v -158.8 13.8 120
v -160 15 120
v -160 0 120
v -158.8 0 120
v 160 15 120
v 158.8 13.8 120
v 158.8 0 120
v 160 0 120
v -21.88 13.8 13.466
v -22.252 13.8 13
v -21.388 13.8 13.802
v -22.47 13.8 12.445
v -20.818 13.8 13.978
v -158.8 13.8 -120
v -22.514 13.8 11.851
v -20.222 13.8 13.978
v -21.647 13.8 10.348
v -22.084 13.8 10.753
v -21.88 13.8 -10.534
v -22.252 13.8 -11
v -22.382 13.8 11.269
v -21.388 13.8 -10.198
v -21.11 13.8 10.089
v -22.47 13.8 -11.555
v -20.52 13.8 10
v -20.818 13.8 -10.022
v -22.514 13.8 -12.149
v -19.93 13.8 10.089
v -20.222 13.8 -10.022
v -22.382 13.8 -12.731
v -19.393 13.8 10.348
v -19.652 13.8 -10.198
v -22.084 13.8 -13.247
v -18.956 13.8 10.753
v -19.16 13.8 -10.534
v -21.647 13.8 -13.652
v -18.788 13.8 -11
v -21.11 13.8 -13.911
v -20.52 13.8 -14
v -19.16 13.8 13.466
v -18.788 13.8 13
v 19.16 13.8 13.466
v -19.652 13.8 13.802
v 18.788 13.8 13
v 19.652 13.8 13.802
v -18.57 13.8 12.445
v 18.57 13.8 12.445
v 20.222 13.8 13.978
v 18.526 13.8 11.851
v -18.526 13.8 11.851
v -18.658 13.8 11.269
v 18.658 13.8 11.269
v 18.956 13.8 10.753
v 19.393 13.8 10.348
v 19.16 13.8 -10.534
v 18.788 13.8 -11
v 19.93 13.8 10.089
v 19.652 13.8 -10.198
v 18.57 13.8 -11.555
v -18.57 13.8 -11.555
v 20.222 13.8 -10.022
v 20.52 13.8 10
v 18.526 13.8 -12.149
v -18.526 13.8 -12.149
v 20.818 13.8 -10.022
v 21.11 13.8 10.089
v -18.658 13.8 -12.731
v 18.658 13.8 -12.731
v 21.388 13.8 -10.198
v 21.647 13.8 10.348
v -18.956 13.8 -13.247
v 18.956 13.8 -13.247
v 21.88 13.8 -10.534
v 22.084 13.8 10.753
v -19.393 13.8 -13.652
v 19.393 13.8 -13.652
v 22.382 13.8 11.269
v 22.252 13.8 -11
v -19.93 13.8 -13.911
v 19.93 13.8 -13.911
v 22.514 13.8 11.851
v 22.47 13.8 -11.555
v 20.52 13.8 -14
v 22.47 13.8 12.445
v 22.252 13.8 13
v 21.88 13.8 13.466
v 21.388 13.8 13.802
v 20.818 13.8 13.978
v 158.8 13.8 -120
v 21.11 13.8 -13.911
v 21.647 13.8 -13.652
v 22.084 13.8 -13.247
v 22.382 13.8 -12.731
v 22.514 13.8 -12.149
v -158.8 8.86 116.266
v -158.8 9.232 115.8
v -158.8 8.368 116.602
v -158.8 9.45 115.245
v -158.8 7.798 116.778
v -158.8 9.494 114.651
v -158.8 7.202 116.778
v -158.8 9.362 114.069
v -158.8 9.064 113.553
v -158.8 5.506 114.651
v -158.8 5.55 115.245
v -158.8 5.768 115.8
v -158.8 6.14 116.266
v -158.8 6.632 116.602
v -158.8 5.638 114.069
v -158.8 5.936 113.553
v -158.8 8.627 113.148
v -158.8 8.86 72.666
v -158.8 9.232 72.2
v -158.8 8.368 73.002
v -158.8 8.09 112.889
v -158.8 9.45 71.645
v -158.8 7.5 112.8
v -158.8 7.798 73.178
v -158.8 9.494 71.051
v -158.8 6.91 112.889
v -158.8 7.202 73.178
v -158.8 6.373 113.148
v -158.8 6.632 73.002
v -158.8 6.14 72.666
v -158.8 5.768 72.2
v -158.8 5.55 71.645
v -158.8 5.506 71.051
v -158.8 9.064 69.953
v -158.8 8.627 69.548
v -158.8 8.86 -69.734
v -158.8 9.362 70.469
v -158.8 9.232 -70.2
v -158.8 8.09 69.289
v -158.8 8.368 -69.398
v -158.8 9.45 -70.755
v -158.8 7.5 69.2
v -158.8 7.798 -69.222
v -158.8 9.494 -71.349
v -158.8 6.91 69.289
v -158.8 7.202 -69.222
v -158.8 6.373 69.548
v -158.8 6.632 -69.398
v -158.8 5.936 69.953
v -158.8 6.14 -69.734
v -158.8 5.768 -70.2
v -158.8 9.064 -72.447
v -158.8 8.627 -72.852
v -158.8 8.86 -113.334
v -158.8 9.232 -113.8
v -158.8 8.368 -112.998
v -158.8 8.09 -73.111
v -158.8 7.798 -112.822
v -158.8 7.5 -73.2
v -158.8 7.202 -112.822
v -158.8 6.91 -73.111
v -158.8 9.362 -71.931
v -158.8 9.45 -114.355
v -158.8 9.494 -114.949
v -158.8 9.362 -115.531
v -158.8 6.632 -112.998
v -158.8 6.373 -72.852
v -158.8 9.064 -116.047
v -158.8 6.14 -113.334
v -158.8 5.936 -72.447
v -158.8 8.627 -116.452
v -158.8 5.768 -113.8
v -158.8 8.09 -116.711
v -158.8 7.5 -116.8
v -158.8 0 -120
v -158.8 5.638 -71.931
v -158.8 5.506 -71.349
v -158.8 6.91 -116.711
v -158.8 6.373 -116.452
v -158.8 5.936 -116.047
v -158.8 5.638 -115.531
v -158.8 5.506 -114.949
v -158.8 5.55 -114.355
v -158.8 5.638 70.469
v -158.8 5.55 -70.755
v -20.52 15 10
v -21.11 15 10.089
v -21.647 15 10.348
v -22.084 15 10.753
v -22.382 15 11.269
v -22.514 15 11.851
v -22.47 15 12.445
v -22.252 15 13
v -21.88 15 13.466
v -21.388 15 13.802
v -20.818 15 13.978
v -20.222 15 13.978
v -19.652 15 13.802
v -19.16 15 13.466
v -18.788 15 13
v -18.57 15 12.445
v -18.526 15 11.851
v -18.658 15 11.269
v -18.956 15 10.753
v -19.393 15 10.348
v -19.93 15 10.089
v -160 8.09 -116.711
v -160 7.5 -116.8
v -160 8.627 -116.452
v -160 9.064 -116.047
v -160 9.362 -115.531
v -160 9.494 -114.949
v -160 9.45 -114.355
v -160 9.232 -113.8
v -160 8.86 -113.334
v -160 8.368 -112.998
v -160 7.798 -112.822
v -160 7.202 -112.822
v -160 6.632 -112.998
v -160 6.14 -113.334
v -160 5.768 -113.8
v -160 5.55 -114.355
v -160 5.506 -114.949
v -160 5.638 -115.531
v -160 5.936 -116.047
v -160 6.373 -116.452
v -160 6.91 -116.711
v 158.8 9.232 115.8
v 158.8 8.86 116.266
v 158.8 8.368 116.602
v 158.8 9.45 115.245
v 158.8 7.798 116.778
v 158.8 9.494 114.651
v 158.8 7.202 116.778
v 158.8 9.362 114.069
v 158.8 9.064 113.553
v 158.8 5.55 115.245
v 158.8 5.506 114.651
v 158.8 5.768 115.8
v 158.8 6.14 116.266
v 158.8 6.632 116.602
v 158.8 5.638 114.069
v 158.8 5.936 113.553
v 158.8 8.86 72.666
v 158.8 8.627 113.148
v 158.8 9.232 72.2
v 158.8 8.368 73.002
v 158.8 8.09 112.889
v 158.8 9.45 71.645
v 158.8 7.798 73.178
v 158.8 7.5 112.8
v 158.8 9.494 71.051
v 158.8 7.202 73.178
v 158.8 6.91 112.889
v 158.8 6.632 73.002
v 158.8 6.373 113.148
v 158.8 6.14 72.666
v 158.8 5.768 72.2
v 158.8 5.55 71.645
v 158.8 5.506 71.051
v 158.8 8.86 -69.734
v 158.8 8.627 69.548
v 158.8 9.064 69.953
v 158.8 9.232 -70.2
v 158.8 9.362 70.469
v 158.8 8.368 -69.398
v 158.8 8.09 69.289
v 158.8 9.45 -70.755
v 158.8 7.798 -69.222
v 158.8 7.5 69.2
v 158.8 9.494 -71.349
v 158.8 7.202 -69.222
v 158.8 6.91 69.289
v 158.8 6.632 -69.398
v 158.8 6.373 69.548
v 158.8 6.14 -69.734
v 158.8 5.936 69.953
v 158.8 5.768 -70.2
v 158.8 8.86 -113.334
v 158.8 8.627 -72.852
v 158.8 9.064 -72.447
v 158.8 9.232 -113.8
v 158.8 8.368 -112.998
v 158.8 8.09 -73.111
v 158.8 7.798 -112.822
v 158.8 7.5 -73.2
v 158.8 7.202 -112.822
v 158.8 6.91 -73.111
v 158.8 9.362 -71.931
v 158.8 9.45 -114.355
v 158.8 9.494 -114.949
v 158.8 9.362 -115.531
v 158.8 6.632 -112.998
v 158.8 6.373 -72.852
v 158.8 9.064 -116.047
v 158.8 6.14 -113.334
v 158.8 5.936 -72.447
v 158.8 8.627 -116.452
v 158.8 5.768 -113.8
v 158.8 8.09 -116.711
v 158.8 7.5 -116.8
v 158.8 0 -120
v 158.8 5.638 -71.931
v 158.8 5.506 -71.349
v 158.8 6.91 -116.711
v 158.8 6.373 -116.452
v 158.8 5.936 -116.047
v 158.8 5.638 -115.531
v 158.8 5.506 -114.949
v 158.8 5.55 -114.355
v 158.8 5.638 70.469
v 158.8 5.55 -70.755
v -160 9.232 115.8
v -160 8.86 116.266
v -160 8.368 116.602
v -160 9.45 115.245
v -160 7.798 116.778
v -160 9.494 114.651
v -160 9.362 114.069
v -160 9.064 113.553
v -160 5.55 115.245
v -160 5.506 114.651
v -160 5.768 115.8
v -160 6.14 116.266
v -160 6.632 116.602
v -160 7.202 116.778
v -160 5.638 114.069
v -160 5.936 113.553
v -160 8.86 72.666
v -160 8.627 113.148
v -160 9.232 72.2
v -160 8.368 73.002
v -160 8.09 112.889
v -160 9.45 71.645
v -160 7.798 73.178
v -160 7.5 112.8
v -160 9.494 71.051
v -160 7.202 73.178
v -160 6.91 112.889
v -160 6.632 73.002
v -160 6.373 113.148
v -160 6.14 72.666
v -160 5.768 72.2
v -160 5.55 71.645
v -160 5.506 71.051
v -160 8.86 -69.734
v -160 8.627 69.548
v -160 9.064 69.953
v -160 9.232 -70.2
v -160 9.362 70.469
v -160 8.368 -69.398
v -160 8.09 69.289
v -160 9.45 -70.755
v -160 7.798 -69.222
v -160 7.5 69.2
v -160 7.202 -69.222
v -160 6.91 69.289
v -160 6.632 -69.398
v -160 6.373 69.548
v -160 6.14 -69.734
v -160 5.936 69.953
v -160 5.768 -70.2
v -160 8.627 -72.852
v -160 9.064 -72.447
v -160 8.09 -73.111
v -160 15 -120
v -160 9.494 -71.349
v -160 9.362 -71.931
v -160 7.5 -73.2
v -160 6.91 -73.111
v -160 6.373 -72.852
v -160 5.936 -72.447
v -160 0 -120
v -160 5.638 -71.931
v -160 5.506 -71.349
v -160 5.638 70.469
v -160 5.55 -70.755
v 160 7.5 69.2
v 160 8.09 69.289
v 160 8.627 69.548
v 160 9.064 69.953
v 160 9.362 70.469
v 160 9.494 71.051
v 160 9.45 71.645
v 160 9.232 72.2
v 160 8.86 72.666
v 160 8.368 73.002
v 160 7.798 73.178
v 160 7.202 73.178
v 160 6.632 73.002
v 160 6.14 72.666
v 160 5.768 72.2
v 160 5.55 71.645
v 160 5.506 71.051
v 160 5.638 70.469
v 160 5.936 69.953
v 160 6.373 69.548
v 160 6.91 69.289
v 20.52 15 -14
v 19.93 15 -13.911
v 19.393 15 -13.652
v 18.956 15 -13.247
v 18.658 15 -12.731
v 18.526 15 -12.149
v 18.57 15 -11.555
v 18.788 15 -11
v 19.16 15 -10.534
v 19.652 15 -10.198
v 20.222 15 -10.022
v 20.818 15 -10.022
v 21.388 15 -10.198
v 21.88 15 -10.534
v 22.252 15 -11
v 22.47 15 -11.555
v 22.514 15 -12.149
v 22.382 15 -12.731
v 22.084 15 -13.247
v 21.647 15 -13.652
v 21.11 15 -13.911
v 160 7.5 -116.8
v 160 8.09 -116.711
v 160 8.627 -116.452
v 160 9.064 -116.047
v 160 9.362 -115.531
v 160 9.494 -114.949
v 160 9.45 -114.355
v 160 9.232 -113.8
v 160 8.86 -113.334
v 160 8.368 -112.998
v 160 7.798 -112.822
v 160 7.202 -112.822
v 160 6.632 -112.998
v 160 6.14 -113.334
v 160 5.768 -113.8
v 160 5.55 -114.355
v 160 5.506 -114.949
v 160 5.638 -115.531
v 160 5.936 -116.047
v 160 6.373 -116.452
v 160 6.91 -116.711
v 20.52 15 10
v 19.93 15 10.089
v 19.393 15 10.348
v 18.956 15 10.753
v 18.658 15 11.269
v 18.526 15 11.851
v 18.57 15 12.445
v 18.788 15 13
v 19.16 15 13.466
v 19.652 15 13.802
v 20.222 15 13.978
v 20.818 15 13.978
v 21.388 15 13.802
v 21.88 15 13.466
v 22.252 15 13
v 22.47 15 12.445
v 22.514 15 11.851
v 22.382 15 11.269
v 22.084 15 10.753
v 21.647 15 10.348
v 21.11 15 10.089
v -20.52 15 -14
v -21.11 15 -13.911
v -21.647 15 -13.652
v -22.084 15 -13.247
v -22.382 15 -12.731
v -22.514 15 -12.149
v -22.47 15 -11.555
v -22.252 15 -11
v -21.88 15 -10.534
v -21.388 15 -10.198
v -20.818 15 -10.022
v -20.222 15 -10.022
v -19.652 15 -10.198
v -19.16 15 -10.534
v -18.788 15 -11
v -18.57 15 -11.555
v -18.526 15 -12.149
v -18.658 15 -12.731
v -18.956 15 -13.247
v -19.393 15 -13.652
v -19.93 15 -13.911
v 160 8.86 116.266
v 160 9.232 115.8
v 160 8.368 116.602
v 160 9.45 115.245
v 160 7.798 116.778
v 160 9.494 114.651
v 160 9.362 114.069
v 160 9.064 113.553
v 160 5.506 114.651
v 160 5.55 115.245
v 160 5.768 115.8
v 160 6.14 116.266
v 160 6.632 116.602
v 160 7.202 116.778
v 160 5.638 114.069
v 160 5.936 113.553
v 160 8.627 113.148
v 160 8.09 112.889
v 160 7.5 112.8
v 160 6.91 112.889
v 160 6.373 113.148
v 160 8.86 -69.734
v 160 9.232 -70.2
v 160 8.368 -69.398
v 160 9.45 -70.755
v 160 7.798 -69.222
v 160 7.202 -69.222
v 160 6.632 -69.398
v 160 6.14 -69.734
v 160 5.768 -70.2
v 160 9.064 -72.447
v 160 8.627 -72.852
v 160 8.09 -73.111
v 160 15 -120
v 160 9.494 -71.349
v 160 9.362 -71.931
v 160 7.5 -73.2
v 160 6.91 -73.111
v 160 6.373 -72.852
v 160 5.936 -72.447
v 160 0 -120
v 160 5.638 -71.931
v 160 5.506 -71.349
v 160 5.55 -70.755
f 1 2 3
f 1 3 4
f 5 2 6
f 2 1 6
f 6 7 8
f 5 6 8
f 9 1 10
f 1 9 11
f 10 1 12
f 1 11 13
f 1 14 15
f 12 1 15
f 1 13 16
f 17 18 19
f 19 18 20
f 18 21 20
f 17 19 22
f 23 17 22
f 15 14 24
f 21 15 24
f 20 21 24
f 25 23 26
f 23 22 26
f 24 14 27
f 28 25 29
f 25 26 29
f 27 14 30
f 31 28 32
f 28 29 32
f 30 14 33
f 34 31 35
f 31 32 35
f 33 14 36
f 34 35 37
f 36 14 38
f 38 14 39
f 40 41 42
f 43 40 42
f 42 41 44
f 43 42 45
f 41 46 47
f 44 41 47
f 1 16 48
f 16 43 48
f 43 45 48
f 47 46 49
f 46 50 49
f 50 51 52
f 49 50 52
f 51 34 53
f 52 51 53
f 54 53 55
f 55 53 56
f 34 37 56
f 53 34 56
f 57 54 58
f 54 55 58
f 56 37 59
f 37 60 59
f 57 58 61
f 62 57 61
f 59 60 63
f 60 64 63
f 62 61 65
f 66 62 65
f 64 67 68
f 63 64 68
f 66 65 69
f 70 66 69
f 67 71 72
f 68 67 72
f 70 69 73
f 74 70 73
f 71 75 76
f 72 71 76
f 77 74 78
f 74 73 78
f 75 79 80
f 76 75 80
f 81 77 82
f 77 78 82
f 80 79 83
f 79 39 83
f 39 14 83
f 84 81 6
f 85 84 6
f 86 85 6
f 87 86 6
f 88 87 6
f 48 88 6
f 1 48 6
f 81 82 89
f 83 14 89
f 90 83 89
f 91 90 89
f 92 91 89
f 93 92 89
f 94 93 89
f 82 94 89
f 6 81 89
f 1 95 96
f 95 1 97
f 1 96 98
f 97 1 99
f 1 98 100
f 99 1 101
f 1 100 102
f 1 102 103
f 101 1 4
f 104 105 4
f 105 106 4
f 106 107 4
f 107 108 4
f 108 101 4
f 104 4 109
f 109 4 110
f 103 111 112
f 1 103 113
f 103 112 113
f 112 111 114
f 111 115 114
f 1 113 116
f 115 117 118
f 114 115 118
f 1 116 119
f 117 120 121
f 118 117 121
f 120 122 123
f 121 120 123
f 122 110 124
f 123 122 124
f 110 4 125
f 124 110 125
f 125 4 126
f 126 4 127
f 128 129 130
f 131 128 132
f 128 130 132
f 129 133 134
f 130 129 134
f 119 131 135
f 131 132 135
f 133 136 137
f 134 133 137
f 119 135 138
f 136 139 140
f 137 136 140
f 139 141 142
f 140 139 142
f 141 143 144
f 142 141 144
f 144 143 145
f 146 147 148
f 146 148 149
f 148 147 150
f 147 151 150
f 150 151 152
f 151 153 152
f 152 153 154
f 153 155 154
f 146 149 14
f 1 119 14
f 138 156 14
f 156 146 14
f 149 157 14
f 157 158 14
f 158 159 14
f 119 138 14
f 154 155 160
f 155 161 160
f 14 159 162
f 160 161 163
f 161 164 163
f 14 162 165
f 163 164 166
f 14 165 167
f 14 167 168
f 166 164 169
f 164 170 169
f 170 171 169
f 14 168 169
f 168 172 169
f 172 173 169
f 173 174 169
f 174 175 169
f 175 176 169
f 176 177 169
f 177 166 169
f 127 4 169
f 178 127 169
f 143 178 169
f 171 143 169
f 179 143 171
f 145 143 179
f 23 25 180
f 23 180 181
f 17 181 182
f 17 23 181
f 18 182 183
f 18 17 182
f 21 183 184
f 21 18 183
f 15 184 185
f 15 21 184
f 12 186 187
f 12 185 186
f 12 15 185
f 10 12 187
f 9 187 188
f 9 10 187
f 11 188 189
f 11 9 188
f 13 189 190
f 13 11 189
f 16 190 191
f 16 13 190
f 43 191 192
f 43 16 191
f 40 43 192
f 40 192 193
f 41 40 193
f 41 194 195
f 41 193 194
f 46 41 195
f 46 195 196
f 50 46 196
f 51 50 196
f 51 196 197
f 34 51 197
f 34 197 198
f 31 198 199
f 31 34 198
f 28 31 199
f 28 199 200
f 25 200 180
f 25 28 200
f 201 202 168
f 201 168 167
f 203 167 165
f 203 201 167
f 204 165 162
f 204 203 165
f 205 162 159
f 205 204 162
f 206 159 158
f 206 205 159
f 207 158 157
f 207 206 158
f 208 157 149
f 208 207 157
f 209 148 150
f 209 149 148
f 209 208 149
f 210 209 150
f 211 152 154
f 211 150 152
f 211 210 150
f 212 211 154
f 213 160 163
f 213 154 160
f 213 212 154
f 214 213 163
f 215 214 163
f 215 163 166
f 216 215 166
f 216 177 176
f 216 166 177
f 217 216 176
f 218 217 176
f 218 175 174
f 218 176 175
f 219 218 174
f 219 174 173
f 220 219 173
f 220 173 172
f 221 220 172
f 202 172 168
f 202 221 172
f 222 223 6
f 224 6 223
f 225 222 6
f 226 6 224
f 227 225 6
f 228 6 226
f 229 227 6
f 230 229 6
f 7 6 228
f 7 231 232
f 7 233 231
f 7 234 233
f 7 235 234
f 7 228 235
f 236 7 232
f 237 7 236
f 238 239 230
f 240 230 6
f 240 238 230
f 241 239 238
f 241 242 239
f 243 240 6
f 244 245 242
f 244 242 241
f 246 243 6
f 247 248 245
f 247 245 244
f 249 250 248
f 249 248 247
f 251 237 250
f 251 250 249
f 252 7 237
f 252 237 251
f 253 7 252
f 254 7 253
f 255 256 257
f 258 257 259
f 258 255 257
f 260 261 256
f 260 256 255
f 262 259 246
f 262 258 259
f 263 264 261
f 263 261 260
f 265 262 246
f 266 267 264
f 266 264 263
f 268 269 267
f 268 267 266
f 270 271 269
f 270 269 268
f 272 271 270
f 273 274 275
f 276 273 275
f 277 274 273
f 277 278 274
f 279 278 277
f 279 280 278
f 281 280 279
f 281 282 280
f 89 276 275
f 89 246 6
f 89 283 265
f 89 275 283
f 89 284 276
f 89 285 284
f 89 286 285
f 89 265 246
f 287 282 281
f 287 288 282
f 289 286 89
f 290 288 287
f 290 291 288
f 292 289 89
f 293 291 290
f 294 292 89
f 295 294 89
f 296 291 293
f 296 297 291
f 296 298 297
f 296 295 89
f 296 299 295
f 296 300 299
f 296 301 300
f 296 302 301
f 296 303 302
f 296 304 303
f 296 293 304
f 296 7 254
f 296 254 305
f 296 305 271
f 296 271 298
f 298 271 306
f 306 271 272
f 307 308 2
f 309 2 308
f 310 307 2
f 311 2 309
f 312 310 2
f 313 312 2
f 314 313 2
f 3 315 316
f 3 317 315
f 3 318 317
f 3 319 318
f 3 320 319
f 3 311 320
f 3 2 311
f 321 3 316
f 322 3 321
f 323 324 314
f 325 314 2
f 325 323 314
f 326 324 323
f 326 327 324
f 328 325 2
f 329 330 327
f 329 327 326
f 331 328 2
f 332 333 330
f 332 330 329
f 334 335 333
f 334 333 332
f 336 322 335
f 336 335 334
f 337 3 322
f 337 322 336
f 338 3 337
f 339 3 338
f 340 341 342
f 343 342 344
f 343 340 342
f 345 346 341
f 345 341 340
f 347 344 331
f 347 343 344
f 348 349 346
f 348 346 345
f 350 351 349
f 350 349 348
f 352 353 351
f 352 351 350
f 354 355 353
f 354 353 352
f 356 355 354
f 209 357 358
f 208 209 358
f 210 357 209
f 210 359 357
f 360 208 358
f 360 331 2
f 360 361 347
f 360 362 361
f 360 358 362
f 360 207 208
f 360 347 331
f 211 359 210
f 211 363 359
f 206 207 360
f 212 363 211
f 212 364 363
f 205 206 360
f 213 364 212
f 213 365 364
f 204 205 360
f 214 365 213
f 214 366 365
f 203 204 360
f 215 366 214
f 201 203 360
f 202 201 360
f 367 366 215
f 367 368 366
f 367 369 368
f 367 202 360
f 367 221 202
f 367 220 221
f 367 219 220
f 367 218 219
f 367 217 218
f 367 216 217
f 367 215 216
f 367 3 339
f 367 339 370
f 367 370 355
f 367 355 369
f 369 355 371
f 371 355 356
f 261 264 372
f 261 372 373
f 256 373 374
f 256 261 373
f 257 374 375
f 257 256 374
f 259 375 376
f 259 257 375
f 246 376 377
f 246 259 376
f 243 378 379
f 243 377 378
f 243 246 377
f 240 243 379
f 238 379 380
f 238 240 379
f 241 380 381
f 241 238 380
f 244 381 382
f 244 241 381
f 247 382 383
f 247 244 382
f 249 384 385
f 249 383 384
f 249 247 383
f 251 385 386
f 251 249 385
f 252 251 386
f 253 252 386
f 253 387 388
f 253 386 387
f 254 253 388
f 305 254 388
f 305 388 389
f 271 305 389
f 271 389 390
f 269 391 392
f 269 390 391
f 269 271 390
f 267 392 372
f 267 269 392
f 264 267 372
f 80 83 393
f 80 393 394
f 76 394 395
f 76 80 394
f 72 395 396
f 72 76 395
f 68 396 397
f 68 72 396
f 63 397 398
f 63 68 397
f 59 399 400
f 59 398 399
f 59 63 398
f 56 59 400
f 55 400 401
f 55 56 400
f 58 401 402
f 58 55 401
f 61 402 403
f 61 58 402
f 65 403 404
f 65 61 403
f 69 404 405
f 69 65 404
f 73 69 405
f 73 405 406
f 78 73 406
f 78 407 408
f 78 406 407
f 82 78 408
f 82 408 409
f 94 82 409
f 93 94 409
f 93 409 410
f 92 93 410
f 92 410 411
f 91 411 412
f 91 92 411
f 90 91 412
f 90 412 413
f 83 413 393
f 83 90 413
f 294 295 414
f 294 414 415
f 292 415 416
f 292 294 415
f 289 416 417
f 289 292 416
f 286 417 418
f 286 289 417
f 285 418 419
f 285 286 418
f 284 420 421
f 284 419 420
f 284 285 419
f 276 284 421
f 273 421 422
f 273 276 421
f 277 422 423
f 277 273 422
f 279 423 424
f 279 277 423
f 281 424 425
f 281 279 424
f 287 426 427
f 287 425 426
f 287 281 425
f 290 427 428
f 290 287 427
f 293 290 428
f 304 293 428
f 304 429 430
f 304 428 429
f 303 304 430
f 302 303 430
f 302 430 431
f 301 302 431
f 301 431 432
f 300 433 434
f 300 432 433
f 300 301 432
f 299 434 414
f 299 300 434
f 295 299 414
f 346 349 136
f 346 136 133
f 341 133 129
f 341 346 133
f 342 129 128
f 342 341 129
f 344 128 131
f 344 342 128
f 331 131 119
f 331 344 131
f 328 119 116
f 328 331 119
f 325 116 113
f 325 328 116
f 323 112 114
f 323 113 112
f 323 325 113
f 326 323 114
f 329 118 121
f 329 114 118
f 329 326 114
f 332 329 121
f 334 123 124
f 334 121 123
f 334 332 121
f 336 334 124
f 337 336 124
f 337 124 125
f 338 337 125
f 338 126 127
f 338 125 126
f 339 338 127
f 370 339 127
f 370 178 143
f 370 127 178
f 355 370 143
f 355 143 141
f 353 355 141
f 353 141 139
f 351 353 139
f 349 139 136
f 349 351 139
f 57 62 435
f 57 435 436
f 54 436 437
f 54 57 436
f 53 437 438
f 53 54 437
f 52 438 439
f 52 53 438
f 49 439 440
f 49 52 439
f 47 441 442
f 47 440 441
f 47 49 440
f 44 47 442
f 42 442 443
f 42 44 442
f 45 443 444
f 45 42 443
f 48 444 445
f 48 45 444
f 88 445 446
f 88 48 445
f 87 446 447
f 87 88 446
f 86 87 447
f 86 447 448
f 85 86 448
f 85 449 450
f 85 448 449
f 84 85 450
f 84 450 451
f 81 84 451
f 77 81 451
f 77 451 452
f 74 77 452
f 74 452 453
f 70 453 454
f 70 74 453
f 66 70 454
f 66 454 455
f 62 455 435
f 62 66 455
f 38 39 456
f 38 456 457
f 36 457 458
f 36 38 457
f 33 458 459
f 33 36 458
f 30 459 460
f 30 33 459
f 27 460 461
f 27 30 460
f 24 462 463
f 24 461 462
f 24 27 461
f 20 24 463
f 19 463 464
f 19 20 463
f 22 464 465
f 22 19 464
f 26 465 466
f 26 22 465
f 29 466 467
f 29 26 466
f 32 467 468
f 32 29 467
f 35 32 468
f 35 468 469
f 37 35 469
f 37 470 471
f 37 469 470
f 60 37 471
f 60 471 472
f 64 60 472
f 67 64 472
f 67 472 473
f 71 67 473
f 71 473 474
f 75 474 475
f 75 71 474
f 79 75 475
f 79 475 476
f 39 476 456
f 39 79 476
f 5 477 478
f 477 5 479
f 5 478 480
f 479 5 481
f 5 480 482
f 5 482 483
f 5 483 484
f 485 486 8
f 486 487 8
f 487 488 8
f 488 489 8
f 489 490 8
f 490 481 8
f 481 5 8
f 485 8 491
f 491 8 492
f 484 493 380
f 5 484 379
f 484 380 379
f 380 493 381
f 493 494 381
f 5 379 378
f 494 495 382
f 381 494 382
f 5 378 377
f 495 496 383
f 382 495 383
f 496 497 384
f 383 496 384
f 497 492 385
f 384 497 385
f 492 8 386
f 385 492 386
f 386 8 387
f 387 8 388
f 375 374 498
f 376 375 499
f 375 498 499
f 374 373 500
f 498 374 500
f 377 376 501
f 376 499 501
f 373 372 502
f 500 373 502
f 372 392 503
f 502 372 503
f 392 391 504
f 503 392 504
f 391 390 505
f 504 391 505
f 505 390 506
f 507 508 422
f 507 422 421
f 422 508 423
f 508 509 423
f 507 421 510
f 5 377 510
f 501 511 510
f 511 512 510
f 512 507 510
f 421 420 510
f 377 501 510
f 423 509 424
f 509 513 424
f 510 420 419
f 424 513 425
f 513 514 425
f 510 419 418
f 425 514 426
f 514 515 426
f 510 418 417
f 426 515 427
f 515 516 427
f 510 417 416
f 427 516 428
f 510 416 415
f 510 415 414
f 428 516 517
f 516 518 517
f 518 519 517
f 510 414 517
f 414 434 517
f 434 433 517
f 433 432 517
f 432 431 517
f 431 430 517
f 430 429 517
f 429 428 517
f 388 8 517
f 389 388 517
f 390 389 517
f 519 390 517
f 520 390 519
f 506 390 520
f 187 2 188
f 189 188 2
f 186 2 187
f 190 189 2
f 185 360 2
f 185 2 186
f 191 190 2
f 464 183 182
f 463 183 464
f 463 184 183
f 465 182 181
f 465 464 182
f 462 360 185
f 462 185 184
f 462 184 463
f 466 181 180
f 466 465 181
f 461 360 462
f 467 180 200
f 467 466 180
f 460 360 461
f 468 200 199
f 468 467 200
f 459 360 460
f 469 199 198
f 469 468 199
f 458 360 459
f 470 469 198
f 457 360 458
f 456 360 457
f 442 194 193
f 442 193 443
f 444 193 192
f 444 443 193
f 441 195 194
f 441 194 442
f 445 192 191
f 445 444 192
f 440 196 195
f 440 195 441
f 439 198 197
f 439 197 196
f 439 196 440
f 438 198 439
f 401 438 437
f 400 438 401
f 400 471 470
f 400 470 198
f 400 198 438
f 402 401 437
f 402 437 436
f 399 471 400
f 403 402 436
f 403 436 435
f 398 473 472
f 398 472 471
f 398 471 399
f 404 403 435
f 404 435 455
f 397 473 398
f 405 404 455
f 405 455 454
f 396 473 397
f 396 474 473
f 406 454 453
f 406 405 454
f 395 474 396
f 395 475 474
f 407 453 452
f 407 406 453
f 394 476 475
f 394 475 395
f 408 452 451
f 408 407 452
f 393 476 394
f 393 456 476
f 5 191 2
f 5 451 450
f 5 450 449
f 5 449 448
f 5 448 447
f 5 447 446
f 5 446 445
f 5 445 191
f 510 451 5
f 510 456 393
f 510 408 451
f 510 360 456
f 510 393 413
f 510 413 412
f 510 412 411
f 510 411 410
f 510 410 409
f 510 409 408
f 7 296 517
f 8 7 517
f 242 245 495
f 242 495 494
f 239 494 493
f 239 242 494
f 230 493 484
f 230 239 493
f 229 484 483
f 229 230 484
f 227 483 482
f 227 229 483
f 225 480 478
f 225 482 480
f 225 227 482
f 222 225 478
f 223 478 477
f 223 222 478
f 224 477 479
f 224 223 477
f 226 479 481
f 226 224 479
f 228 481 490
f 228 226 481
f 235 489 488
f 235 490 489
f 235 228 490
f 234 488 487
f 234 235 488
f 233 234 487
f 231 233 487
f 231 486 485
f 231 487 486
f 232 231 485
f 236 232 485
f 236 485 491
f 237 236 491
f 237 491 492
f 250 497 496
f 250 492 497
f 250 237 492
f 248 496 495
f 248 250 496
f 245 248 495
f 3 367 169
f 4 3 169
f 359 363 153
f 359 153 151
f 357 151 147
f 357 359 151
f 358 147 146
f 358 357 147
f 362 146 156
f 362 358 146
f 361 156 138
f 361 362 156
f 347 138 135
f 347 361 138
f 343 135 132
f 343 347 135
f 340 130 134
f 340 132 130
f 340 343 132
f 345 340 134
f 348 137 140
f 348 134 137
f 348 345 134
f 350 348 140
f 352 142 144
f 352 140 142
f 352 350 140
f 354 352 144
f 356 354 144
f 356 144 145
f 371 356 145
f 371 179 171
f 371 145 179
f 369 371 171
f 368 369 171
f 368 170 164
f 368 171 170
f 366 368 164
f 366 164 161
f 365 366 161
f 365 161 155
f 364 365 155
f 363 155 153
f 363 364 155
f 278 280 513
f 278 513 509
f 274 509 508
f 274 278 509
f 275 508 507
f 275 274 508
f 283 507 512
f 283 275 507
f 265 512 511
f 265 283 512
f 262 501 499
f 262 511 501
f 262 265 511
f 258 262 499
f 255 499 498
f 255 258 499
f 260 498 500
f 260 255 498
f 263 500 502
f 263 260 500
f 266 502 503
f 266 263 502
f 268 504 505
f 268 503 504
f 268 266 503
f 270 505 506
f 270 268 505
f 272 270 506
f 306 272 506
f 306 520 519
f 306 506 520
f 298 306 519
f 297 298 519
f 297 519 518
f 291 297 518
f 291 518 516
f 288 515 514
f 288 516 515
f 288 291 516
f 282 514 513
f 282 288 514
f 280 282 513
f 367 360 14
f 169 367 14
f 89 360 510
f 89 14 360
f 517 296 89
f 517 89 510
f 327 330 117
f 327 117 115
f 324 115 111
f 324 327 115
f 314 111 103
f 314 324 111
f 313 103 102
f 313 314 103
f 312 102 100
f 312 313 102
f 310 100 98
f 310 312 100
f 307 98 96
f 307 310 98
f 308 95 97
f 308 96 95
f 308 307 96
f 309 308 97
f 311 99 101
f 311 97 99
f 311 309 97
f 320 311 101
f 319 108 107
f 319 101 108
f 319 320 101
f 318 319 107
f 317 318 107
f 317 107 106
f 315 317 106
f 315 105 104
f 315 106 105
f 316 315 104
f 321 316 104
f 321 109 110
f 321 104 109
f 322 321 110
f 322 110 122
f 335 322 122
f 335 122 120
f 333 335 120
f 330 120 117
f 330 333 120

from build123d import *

# Parameters (mm, degrees)
ESBO_O1_W                  = 320
ESBO_O1_H                  = 240
RESSALTO_EXTRUS_O1_DEPTH   = 15
ESBO_O2_W                  = 317.6
ESBO_O2_H                  = 240
CORTE_EXTRUS_O1_DEPTH      = 13.8
CORTE_EXTRUS_O2_START      = 10
ESBO_O3_R                  = 2
CORTE_EXTRUS_O2_DEPTH      = 13.8
CORTE_EXTRUS_O3_DEPTH      = 170
CORTE_EXTRUS_O3_DEPTH_BACK = 170
ESBO_O4_R                  = 2


with BuildPart() as part:
    # Esboço1 → Ressalto-extrusão1 (new body)
    with BuildSketch(Plane(origin=(0, 0, 0), x_dir=(1, 0, 0), z_dir=(0, 1, 0))):
        Rectangle(ESBO_O1_W, ESBO_O1_H)
    extrude(amount=RESSALTO_EXTRUS_O1_DEPTH)

    # Esboço2 → Corte-extrusão1 (cut)
    with BuildSketch(Plane(origin=(0, 0, 0), x_dir=(1, 0, 0), z_dir=(0, 1, 0))):
        Rectangle(ESBO_O2_W, ESBO_O2_H)
    extrude(amount=CORTE_EXTRUS_O1_DEPTH, mode=Mode.SUBTRACT)

    # Esboço3 → Corte-extrusão2 (cut)
    with BuildSketch(Plane(origin=(0, 0, 0), x_dir=(1, 0, 0), z_dir=(0, 1, 0)).offset(CORTE_EXTRUS_O2_START)):
        with Locations(Location((-20.52, -12, 0), (0, 0, 90))):
            Circle(ESBO_O3_R)
        with Locations(Location((20.52, -12, 0), (0, 0, 90))):
            Circle(ESBO_O3_R)
        with Locations(Location((20.52, 12, 0), (0, 0, 90))):
            Circle(ESBO_O3_R)
        with Locations(Location((-20.52, 12, 0), (0, 0, 90))):
            Circle(ESBO_O3_R)
    extrude(amount=CORTE_EXTRUS_O2_DEPTH, mode=Mode.SUBTRACT)

    # Esboço4 → Corte-extrusão3 (cut, two sides: drawn at the far end of the back side and taken through both)
    with BuildSketch(Plane(origin=(0, 0, 0), x_dir=(0, 0, -1), z_dir=(1, 0, 0)).offset(-CORTE_EXTRUS_O3_DEPTH_BACK)):
        with Locations((114.8, 7.5)):
            Circle(ESBO_O4_R)
        with Locations((71.2, 7.5)):
            Circle(ESBO_O4_R)
        with Locations((-114.8, 7.5)):
            Circle(ESBO_O4_R)
        with Locations((-71.2, 7.5)):
            Circle(ESBO_O4_R)
    extrude(amount=CORTE_EXTRUS_O3_DEPTH + CORTE_EXTRUS_O3_DEPTH_BACK, mode=Mode.SUBTRACT)


solid = part.part
